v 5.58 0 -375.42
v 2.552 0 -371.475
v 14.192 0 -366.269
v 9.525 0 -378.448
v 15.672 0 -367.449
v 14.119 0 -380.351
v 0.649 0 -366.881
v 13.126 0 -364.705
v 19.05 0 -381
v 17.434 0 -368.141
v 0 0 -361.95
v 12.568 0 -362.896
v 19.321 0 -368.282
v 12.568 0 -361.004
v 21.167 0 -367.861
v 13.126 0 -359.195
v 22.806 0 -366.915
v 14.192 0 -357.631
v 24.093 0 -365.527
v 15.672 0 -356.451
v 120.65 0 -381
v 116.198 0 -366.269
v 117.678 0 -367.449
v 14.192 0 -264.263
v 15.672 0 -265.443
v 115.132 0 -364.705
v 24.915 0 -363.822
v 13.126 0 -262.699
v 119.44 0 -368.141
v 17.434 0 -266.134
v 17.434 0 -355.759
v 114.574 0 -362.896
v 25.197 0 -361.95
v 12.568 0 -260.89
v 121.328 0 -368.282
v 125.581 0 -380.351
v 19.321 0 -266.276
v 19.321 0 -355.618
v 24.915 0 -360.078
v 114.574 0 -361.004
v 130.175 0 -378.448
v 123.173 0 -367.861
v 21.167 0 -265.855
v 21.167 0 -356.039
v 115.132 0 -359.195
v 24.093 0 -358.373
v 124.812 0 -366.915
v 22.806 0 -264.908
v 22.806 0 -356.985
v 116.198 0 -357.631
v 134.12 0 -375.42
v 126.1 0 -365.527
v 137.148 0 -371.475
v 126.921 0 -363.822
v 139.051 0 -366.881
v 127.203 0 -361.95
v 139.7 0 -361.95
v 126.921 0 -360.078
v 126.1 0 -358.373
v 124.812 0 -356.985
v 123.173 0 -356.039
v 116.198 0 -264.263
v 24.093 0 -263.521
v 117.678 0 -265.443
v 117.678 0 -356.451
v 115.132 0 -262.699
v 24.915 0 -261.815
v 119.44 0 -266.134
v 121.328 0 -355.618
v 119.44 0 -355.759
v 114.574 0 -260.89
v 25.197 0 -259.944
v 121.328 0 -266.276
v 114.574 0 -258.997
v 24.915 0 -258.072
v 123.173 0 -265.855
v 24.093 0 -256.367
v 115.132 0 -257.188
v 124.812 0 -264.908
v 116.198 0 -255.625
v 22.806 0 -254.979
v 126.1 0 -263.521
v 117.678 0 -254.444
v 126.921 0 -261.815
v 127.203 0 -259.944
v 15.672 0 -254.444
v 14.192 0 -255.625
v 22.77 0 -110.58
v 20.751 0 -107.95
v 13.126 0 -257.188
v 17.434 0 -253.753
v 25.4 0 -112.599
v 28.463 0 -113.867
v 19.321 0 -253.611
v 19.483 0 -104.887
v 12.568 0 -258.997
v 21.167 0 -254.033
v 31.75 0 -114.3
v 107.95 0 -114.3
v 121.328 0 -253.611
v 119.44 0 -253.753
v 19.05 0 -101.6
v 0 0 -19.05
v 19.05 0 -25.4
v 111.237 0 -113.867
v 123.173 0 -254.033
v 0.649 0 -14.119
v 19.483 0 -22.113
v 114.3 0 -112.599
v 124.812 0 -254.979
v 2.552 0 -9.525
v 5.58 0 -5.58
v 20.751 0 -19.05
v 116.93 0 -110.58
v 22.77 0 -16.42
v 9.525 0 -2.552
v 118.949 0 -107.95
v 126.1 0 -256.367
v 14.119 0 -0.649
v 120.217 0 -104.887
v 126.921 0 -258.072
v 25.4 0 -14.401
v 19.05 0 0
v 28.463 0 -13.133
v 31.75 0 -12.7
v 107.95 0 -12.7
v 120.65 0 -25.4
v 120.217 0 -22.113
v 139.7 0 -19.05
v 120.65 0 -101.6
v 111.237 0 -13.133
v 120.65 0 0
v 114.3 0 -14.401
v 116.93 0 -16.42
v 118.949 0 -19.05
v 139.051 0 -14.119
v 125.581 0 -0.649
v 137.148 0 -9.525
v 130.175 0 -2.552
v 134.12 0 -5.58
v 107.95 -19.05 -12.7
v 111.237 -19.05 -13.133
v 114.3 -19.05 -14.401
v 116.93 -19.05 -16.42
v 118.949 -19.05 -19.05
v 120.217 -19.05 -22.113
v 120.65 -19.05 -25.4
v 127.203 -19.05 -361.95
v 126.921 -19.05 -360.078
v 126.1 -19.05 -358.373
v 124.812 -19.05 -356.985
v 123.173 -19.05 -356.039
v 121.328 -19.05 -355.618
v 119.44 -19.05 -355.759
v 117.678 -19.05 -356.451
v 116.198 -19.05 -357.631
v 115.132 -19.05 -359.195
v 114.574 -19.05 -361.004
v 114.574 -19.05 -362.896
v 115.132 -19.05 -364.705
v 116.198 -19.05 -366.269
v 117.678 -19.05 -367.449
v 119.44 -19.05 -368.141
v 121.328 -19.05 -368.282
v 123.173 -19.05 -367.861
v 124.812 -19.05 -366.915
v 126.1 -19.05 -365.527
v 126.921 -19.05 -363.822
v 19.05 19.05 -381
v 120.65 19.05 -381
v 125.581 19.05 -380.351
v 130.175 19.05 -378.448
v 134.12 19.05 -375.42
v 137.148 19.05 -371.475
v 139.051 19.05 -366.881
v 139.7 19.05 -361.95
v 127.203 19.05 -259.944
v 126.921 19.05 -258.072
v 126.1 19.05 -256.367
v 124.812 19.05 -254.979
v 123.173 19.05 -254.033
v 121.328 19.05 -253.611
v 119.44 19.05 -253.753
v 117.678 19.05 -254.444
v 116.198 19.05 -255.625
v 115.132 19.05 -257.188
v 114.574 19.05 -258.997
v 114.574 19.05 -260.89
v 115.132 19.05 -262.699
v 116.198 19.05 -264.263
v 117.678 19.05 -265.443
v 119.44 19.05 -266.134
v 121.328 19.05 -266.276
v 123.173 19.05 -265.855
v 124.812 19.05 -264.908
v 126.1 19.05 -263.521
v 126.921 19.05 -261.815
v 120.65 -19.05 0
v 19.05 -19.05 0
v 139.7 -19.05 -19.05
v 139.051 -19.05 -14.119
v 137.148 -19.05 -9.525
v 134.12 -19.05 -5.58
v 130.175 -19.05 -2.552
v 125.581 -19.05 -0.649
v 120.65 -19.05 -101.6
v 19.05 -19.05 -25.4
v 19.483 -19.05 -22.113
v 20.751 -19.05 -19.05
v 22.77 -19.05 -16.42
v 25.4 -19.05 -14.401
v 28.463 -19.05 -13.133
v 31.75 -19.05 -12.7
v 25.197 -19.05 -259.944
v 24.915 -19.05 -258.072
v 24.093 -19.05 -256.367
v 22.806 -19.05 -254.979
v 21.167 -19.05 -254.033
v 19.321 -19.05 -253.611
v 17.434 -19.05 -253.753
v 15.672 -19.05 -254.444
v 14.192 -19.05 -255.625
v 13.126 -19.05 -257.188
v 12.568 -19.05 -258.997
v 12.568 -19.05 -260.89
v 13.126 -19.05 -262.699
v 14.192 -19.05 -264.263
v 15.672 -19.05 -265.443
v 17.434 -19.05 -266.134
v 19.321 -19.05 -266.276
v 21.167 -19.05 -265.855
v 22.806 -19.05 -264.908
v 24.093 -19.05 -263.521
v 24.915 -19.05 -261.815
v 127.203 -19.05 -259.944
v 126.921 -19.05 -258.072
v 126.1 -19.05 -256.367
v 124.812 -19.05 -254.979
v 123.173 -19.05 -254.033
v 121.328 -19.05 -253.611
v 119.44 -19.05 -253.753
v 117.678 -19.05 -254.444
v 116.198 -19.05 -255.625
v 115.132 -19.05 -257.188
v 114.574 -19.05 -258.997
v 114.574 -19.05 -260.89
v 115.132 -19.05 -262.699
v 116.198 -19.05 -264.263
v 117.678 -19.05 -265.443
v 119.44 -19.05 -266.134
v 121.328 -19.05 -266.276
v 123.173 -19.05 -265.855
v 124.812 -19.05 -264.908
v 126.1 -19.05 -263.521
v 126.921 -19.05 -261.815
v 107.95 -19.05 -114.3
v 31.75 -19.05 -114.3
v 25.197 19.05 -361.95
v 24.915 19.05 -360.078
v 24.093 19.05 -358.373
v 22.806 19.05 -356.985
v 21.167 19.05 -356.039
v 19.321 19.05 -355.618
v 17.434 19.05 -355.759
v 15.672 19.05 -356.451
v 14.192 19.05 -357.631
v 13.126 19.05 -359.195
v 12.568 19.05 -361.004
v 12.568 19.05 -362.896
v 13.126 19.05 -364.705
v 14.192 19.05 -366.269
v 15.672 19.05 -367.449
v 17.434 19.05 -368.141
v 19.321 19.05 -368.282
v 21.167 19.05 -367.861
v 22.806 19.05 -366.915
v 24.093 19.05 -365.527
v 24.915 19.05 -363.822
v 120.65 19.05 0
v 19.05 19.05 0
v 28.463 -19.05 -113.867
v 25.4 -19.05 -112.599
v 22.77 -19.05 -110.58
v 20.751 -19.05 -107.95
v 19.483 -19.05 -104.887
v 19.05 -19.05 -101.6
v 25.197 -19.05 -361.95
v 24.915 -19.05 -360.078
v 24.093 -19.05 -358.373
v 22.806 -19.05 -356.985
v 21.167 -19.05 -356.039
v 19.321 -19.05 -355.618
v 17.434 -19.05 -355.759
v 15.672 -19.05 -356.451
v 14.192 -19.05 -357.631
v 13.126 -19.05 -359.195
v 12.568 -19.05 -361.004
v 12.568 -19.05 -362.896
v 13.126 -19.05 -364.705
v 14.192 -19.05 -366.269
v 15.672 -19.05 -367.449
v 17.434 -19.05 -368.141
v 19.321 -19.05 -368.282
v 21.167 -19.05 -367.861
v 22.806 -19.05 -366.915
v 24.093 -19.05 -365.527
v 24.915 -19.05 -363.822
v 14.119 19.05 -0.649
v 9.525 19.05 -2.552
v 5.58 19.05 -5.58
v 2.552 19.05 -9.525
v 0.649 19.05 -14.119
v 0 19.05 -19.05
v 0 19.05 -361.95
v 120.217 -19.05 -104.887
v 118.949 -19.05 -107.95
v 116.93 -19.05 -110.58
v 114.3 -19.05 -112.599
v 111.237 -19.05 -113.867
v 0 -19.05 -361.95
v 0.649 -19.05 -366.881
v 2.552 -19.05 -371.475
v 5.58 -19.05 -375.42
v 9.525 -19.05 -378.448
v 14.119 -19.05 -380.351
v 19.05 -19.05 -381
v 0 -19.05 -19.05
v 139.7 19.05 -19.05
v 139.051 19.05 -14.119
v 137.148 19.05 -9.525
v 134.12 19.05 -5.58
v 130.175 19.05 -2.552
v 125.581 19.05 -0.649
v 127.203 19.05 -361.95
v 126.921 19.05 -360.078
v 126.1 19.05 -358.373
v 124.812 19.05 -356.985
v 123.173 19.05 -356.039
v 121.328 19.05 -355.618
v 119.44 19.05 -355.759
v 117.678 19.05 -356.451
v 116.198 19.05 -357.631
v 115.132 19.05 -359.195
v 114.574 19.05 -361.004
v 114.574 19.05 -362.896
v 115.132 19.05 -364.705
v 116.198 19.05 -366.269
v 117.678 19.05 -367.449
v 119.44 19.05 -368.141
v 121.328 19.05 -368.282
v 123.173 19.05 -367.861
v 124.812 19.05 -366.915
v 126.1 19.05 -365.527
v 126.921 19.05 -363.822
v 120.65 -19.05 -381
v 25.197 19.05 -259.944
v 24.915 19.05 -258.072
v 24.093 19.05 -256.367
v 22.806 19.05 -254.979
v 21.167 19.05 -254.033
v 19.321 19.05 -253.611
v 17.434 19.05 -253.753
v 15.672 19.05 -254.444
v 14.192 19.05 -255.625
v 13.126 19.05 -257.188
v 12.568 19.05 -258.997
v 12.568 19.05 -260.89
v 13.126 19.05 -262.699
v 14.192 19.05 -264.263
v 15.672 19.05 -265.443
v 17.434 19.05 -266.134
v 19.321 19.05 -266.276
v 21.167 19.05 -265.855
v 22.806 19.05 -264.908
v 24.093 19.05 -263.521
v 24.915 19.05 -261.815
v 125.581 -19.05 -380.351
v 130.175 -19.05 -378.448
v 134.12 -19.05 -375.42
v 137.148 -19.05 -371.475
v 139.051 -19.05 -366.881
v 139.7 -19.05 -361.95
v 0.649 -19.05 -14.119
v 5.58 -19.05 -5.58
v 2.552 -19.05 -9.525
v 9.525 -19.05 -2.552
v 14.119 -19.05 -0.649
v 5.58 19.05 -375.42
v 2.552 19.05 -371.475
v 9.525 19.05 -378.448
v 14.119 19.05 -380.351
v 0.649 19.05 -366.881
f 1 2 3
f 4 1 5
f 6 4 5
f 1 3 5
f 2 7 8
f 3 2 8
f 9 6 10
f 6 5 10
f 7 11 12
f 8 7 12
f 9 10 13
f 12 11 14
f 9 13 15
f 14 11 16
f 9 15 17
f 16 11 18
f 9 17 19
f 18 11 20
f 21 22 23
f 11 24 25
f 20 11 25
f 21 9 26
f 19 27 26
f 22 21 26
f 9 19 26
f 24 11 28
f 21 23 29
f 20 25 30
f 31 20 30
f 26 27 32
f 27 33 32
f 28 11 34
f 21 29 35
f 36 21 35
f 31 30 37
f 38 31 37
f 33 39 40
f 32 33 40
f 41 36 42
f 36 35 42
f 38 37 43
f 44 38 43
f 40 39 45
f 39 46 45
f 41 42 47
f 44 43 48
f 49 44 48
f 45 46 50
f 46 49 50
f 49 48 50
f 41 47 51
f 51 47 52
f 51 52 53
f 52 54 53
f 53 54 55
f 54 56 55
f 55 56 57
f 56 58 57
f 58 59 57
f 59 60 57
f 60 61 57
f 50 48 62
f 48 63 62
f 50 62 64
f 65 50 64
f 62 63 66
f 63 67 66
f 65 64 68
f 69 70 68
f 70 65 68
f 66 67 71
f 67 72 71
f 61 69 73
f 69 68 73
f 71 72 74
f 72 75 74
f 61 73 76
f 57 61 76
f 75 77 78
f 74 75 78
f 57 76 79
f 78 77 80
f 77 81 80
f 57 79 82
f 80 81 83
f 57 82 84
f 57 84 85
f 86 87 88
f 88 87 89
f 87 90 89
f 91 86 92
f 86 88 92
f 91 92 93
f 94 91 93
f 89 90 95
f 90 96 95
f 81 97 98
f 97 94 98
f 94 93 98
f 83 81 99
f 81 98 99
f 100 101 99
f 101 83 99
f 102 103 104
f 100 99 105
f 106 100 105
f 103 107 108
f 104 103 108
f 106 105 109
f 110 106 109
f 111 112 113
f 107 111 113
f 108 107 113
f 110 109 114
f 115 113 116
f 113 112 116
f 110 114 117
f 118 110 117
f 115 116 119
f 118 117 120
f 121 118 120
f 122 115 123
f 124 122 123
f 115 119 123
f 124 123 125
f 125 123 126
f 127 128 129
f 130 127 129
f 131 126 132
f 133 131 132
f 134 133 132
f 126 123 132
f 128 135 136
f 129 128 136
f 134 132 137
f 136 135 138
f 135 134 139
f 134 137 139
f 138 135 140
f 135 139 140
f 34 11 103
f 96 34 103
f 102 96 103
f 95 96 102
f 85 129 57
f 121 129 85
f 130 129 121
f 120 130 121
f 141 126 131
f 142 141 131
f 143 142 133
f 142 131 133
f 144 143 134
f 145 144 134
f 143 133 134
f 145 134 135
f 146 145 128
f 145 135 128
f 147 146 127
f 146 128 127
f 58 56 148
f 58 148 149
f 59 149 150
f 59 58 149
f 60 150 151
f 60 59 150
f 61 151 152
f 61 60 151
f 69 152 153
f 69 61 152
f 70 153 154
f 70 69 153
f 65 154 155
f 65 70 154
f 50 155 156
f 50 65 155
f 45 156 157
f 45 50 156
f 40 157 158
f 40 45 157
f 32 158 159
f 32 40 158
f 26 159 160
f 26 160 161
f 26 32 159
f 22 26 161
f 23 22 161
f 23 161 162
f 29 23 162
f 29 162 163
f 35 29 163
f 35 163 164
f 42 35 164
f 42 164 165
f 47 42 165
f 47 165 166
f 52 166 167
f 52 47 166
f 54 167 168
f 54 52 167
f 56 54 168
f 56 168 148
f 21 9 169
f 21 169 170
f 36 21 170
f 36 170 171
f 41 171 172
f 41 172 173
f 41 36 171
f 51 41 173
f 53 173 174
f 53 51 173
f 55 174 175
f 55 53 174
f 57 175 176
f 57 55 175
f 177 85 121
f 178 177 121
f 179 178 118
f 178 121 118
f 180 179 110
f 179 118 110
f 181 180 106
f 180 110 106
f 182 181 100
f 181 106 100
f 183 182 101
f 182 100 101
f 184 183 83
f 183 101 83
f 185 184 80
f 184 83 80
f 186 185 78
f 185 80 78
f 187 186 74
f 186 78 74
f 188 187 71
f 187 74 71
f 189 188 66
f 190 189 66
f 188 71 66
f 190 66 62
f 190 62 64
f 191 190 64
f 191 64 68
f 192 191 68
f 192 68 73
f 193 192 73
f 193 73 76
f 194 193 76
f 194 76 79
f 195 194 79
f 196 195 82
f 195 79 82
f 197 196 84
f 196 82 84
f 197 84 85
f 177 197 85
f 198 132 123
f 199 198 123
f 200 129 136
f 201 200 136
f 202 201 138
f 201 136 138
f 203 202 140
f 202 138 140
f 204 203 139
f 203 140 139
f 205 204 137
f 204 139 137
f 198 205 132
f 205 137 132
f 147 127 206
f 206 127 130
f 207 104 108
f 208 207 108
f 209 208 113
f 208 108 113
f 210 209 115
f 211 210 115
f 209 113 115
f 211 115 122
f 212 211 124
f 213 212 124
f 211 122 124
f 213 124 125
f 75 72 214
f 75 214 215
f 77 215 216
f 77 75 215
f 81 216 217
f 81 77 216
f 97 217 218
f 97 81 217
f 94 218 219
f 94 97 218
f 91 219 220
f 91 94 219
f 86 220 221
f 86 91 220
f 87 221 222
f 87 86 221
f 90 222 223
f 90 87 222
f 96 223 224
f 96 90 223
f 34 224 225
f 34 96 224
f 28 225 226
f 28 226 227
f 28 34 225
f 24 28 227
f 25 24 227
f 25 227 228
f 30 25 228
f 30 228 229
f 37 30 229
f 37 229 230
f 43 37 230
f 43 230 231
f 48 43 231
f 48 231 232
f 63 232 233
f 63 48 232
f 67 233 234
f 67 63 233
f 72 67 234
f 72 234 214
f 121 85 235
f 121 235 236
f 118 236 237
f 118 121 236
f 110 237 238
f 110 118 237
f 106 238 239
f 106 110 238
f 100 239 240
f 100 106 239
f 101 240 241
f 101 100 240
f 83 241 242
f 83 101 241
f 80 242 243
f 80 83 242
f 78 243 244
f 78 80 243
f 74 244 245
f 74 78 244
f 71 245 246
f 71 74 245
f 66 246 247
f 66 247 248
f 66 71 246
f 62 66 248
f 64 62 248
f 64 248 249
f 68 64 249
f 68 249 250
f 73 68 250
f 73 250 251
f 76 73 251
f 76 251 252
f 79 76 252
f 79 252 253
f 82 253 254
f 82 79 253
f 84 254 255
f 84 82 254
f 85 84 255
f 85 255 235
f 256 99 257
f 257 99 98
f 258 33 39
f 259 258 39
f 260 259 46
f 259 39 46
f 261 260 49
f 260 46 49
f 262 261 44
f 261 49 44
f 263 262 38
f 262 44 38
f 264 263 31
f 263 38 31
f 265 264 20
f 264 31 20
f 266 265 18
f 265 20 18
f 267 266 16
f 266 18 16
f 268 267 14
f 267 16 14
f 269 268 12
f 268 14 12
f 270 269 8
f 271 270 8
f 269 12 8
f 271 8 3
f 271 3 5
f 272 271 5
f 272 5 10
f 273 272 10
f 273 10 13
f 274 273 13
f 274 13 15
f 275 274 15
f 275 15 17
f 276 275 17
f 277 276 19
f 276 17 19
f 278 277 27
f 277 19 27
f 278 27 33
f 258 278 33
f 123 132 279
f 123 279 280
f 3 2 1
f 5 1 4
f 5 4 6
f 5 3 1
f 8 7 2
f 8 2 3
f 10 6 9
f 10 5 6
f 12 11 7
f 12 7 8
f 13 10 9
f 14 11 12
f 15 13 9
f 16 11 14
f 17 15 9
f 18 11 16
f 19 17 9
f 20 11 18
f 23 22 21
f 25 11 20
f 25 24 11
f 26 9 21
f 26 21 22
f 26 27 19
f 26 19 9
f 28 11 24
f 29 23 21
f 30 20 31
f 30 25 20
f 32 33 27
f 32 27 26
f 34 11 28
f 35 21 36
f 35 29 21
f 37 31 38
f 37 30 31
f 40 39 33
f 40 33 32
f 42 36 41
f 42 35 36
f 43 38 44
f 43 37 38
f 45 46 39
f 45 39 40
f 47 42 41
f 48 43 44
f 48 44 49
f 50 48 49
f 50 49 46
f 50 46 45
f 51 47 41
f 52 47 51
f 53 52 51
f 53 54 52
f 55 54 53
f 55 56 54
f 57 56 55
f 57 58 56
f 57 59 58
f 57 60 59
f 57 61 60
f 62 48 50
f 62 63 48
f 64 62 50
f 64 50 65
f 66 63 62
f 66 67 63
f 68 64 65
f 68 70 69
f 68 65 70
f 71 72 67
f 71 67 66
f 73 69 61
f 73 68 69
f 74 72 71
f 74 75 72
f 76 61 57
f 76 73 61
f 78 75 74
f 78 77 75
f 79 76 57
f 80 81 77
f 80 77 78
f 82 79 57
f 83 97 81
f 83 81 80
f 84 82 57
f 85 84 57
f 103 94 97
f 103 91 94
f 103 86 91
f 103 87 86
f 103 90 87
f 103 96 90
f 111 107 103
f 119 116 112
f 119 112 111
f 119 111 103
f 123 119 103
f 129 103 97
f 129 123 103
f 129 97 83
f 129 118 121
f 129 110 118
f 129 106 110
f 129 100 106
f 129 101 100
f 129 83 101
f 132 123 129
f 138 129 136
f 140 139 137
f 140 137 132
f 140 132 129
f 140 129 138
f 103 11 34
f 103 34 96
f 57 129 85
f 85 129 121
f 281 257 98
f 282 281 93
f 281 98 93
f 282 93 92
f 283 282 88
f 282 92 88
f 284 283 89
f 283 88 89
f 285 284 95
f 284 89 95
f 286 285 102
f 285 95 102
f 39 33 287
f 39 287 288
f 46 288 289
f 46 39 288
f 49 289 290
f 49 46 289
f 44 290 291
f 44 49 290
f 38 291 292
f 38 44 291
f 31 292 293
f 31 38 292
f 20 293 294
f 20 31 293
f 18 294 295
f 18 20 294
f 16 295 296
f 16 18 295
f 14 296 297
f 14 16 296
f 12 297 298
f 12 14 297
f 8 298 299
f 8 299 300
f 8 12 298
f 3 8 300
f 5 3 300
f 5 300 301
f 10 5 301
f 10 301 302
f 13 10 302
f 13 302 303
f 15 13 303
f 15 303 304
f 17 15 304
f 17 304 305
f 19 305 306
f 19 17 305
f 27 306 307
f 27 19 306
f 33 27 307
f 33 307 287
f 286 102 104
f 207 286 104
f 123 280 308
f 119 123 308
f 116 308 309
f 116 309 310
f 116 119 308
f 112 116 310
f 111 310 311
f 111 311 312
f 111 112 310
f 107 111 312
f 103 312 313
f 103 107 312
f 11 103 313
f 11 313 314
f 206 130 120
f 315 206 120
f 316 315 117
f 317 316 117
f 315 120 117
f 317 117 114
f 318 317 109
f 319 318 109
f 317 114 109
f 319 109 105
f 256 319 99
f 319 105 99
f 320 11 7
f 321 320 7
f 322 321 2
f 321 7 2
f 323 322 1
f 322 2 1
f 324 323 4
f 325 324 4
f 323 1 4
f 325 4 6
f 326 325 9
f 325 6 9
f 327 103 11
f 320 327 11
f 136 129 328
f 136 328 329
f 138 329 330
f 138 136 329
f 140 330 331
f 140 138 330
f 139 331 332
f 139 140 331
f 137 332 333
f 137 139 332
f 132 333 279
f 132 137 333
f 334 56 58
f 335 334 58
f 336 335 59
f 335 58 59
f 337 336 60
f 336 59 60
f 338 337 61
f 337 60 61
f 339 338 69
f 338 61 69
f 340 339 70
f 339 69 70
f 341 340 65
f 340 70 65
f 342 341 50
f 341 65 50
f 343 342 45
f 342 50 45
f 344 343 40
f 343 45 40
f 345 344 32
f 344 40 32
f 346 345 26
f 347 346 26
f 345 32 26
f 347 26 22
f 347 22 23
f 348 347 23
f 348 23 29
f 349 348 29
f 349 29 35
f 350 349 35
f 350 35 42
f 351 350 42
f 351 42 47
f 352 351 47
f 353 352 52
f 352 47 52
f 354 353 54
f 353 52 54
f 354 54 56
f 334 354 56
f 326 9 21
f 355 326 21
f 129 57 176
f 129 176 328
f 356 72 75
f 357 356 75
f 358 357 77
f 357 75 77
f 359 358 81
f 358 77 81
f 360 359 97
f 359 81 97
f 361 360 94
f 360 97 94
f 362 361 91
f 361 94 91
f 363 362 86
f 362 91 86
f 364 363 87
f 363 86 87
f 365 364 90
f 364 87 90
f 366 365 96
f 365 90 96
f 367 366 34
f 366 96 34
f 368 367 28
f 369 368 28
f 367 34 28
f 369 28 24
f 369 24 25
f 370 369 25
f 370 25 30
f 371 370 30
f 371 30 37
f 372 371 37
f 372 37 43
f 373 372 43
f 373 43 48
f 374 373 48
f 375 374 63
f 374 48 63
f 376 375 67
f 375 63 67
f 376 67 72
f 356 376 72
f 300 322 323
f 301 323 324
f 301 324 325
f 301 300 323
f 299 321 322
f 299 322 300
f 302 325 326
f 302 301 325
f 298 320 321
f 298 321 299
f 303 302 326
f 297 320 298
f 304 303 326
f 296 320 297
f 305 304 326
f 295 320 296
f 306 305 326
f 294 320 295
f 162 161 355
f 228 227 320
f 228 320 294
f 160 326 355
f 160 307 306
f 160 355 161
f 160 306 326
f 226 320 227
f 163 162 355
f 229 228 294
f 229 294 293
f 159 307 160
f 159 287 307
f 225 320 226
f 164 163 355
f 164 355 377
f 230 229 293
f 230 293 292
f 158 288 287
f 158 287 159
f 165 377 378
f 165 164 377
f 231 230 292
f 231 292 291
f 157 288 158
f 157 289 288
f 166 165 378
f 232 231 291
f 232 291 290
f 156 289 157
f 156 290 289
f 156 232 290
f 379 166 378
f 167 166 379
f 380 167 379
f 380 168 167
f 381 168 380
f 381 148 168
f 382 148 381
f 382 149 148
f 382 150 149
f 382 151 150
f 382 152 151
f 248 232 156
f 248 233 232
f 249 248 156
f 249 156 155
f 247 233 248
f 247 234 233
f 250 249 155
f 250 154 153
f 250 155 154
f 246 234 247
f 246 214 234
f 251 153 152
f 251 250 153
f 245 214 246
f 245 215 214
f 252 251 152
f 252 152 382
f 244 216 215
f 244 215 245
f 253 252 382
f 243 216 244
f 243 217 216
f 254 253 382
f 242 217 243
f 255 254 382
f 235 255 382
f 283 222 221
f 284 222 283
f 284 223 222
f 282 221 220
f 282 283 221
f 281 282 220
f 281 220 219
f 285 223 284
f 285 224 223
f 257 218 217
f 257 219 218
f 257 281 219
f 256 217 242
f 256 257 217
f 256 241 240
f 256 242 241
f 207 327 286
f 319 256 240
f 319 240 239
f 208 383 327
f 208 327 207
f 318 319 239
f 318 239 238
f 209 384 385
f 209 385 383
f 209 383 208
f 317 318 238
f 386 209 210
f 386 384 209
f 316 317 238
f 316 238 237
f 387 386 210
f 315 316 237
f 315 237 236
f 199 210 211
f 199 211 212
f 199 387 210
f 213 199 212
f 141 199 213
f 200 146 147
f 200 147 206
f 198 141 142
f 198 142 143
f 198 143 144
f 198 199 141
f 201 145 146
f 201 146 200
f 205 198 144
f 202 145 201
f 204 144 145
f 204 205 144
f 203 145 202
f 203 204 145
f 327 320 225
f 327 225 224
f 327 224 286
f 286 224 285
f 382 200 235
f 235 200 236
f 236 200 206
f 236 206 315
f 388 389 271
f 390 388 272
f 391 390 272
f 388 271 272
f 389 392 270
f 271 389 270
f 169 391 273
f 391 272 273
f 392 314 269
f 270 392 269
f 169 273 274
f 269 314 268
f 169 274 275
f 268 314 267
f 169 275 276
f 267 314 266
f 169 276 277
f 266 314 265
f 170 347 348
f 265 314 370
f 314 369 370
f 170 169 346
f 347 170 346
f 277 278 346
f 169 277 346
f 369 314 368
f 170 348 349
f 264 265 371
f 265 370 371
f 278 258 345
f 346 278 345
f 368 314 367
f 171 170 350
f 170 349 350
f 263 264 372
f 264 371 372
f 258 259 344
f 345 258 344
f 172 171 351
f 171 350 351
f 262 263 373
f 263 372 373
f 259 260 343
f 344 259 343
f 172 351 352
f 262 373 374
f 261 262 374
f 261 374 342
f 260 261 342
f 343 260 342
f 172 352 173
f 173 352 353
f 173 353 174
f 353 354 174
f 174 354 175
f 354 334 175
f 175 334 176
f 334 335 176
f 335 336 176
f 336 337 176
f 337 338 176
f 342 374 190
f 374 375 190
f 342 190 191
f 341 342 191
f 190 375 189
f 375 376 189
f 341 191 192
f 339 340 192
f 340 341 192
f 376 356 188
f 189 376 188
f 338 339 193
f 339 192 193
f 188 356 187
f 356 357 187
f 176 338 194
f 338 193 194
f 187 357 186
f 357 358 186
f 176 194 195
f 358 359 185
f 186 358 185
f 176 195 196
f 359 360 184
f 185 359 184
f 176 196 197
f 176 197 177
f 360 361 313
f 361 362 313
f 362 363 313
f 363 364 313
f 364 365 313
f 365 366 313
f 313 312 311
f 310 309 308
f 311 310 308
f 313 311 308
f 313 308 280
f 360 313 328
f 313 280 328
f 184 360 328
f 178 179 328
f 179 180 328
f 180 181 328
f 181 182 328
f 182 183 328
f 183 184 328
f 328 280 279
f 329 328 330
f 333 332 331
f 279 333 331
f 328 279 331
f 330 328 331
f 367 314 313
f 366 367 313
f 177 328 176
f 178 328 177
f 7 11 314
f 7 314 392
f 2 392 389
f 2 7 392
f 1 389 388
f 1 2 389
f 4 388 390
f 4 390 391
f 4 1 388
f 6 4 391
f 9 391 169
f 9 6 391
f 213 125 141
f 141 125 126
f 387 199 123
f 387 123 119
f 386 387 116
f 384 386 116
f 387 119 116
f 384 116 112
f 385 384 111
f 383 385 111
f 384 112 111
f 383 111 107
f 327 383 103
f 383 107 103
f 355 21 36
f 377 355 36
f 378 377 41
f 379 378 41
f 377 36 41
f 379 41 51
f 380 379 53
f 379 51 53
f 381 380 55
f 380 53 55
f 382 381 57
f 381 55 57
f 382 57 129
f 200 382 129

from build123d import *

# Parameters (mm, degrees)
F0_R     = 6.35
F1_DEPTH = 19.05
F2_DEPTH = 19.05


with BuildPart() as f1:
    # F0 (on Front) → F1 (new body)
    with BuildSketch(Plane.XZ):
        with BuildLine():
            Line((120.65, 0), (19.05, 0))
            ThreePointArc((19.05, 0), (5.5796158184, -5.5796158184), (0, -19.05))
            Line((0, -19.05), (0, -361.95))
            ThreePointArc((0, -361.95), (5.5796158184, -375.4203841816), (19.05, -381))
            Line((19.05, -381), (120.65, -381))
            ThreePointArc((120.65, -381), (134.1203841816, -375.4203841816), (139.7, -361.95))
            Line((139.7, -361.95), (139.7, -19.05))
            ThreePointArc((139.7, -19.05), (134.1203841816, -5.5796158184), (120.65, 0))
        make_face()
        with Locations((18.8468, -361.95)):
            Circle(F0_R, mode=Mode.SUBTRACT)
        with Locations((18.8468, -259.9436)):
            Circle(F0_R, mode=Mode.SUBTRACT)
        with Locations((120.8532, -361.95)):
            Circle(F0_R, mode=Mode.SUBTRACT)
        with Locations((120.8532, -259.9436)):
            Circle(F0_R, mode=Mode.SUBTRACT)
        with BuildLine():
            ThreePointArc((19.05, -25.4), (22.7697438789, -16.4197438789), (31.75, -12.7))
            Line((31.75, -12.7), (107.95, -12.7))
            ThreePointArc((107.95, -12.7), (116.9302561211, -16.4197438789), (120.65, -25.4))
            Line((120.65, -25.4), (120.65, -101.6))
            ThreePointArc((120.65, -101.6), (116.9302561211, -110.5802561211), (107.95, -114.3))
            Line((107.95, -114.3), (31.75, -114.3))
            ThreePointArc((31.75, -114.3), (22.7697438789, -110.5802561211), (19.05, -101.6))
            Line((19.05, -101.6), (19.05, -25.4))
        make_face(mode=Mode.SUBTRACT)
    extrude(amount=F1_DEPTH)


with BuildPart() as f2:
    # F0 (on Front) → F2 (new body)
    with BuildSketch(Plane.XZ):
        with BuildLine():
            Line((120.65, 0), (19.05, 0))
            ThreePointArc((19.05, 0), (5.5796158184, -5.5796158184), (0, -19.05))
            Line((0, -19.05), (0, -361.95))
            ThreePointArc((0, -361.95), (5.5796158184, -375.4203841816), (19.05, -381))
            Line((19.05, -381), (120.65, -381))
            ThreePointArc((120.65, -381), (134.1203841816, -375.4203841816), (139.7, -361.95))
            Line((139.7, -361.95), (139.7, -19.05))
            ThreePointArc((139.7, -19.05), (134.1203841816, -5.5796158184), (120.65, 0))
        make_face()
        with Locations((18.8468, -361.95)):
            Circle(F0_R, mode=Mode.SUBTRACT)
        with Locations((18.8468, -259.9436)):
            Circle(F0_R, mode=Mode.SUBTRACT)
        with Locations((120.8532, -361.95)):
            Circle(F0_R, mode=Mode.SUBTRACT)
        with Locations((120.8532, -259.9436)):
            Circle(F0_R, mode=Mode.SUBTRACT)
        with BuildLine():
            ThreePointArc((19.05, -25.4), (22.7697438789, -16.4197438789), (31.75, -12.7))
            Line((31.75, -12.7), (107.95, -12.7))
            ThreePointArc((107.95, -12.7), (116.9302561211, -16.4197438789), (120.65, -25.4))
            Line((120.65, -25.4), (120.65, -101.6))
            ThreePointArc((120.65, -101.6), (116.9302561211, -110.5802561211), (107.95, -114.3))
            Line((107.95, -114.3), (31.75, -114.3))
            ThreePointArc((31.75, -114.3), (22.7697438789, -110.5802561211), (19.05, -101.6))
            Line((19.05, -101.6), (19.05, -25.4))
        make_face(mode=Mode.SUBTRACT)
        with BuildLine():
            Line((107.95, -12.7), (31.75, -12.7))
            ThreePointArc((31.75, -12.7), (22.7697438789, -16.4197438789), (19.05, -25.4))
            Line((19.05, -25.4), (19.05, -101.6))
            ThreePointArc((19.05, -101.6), (22.7697438789, -110.5802561211), (31.75, -114.3))
            Line((31.75, -114.3), (107.95, -114.3))
            ThreePointArc((107.95, -114.3), (116.9302561211, -110.5802561211), (120.65, -101.6))
            Line((120.65, -101.6), (120.65, -25.4))
            ThreePointArc((120.65, -25.4), (116.9302561211, -16.4197438789), (107.95, -12.7))
        make_face()
    extrude(amount=-F2_DEPTH)


solid = Compound([f1.part, f2.part])
